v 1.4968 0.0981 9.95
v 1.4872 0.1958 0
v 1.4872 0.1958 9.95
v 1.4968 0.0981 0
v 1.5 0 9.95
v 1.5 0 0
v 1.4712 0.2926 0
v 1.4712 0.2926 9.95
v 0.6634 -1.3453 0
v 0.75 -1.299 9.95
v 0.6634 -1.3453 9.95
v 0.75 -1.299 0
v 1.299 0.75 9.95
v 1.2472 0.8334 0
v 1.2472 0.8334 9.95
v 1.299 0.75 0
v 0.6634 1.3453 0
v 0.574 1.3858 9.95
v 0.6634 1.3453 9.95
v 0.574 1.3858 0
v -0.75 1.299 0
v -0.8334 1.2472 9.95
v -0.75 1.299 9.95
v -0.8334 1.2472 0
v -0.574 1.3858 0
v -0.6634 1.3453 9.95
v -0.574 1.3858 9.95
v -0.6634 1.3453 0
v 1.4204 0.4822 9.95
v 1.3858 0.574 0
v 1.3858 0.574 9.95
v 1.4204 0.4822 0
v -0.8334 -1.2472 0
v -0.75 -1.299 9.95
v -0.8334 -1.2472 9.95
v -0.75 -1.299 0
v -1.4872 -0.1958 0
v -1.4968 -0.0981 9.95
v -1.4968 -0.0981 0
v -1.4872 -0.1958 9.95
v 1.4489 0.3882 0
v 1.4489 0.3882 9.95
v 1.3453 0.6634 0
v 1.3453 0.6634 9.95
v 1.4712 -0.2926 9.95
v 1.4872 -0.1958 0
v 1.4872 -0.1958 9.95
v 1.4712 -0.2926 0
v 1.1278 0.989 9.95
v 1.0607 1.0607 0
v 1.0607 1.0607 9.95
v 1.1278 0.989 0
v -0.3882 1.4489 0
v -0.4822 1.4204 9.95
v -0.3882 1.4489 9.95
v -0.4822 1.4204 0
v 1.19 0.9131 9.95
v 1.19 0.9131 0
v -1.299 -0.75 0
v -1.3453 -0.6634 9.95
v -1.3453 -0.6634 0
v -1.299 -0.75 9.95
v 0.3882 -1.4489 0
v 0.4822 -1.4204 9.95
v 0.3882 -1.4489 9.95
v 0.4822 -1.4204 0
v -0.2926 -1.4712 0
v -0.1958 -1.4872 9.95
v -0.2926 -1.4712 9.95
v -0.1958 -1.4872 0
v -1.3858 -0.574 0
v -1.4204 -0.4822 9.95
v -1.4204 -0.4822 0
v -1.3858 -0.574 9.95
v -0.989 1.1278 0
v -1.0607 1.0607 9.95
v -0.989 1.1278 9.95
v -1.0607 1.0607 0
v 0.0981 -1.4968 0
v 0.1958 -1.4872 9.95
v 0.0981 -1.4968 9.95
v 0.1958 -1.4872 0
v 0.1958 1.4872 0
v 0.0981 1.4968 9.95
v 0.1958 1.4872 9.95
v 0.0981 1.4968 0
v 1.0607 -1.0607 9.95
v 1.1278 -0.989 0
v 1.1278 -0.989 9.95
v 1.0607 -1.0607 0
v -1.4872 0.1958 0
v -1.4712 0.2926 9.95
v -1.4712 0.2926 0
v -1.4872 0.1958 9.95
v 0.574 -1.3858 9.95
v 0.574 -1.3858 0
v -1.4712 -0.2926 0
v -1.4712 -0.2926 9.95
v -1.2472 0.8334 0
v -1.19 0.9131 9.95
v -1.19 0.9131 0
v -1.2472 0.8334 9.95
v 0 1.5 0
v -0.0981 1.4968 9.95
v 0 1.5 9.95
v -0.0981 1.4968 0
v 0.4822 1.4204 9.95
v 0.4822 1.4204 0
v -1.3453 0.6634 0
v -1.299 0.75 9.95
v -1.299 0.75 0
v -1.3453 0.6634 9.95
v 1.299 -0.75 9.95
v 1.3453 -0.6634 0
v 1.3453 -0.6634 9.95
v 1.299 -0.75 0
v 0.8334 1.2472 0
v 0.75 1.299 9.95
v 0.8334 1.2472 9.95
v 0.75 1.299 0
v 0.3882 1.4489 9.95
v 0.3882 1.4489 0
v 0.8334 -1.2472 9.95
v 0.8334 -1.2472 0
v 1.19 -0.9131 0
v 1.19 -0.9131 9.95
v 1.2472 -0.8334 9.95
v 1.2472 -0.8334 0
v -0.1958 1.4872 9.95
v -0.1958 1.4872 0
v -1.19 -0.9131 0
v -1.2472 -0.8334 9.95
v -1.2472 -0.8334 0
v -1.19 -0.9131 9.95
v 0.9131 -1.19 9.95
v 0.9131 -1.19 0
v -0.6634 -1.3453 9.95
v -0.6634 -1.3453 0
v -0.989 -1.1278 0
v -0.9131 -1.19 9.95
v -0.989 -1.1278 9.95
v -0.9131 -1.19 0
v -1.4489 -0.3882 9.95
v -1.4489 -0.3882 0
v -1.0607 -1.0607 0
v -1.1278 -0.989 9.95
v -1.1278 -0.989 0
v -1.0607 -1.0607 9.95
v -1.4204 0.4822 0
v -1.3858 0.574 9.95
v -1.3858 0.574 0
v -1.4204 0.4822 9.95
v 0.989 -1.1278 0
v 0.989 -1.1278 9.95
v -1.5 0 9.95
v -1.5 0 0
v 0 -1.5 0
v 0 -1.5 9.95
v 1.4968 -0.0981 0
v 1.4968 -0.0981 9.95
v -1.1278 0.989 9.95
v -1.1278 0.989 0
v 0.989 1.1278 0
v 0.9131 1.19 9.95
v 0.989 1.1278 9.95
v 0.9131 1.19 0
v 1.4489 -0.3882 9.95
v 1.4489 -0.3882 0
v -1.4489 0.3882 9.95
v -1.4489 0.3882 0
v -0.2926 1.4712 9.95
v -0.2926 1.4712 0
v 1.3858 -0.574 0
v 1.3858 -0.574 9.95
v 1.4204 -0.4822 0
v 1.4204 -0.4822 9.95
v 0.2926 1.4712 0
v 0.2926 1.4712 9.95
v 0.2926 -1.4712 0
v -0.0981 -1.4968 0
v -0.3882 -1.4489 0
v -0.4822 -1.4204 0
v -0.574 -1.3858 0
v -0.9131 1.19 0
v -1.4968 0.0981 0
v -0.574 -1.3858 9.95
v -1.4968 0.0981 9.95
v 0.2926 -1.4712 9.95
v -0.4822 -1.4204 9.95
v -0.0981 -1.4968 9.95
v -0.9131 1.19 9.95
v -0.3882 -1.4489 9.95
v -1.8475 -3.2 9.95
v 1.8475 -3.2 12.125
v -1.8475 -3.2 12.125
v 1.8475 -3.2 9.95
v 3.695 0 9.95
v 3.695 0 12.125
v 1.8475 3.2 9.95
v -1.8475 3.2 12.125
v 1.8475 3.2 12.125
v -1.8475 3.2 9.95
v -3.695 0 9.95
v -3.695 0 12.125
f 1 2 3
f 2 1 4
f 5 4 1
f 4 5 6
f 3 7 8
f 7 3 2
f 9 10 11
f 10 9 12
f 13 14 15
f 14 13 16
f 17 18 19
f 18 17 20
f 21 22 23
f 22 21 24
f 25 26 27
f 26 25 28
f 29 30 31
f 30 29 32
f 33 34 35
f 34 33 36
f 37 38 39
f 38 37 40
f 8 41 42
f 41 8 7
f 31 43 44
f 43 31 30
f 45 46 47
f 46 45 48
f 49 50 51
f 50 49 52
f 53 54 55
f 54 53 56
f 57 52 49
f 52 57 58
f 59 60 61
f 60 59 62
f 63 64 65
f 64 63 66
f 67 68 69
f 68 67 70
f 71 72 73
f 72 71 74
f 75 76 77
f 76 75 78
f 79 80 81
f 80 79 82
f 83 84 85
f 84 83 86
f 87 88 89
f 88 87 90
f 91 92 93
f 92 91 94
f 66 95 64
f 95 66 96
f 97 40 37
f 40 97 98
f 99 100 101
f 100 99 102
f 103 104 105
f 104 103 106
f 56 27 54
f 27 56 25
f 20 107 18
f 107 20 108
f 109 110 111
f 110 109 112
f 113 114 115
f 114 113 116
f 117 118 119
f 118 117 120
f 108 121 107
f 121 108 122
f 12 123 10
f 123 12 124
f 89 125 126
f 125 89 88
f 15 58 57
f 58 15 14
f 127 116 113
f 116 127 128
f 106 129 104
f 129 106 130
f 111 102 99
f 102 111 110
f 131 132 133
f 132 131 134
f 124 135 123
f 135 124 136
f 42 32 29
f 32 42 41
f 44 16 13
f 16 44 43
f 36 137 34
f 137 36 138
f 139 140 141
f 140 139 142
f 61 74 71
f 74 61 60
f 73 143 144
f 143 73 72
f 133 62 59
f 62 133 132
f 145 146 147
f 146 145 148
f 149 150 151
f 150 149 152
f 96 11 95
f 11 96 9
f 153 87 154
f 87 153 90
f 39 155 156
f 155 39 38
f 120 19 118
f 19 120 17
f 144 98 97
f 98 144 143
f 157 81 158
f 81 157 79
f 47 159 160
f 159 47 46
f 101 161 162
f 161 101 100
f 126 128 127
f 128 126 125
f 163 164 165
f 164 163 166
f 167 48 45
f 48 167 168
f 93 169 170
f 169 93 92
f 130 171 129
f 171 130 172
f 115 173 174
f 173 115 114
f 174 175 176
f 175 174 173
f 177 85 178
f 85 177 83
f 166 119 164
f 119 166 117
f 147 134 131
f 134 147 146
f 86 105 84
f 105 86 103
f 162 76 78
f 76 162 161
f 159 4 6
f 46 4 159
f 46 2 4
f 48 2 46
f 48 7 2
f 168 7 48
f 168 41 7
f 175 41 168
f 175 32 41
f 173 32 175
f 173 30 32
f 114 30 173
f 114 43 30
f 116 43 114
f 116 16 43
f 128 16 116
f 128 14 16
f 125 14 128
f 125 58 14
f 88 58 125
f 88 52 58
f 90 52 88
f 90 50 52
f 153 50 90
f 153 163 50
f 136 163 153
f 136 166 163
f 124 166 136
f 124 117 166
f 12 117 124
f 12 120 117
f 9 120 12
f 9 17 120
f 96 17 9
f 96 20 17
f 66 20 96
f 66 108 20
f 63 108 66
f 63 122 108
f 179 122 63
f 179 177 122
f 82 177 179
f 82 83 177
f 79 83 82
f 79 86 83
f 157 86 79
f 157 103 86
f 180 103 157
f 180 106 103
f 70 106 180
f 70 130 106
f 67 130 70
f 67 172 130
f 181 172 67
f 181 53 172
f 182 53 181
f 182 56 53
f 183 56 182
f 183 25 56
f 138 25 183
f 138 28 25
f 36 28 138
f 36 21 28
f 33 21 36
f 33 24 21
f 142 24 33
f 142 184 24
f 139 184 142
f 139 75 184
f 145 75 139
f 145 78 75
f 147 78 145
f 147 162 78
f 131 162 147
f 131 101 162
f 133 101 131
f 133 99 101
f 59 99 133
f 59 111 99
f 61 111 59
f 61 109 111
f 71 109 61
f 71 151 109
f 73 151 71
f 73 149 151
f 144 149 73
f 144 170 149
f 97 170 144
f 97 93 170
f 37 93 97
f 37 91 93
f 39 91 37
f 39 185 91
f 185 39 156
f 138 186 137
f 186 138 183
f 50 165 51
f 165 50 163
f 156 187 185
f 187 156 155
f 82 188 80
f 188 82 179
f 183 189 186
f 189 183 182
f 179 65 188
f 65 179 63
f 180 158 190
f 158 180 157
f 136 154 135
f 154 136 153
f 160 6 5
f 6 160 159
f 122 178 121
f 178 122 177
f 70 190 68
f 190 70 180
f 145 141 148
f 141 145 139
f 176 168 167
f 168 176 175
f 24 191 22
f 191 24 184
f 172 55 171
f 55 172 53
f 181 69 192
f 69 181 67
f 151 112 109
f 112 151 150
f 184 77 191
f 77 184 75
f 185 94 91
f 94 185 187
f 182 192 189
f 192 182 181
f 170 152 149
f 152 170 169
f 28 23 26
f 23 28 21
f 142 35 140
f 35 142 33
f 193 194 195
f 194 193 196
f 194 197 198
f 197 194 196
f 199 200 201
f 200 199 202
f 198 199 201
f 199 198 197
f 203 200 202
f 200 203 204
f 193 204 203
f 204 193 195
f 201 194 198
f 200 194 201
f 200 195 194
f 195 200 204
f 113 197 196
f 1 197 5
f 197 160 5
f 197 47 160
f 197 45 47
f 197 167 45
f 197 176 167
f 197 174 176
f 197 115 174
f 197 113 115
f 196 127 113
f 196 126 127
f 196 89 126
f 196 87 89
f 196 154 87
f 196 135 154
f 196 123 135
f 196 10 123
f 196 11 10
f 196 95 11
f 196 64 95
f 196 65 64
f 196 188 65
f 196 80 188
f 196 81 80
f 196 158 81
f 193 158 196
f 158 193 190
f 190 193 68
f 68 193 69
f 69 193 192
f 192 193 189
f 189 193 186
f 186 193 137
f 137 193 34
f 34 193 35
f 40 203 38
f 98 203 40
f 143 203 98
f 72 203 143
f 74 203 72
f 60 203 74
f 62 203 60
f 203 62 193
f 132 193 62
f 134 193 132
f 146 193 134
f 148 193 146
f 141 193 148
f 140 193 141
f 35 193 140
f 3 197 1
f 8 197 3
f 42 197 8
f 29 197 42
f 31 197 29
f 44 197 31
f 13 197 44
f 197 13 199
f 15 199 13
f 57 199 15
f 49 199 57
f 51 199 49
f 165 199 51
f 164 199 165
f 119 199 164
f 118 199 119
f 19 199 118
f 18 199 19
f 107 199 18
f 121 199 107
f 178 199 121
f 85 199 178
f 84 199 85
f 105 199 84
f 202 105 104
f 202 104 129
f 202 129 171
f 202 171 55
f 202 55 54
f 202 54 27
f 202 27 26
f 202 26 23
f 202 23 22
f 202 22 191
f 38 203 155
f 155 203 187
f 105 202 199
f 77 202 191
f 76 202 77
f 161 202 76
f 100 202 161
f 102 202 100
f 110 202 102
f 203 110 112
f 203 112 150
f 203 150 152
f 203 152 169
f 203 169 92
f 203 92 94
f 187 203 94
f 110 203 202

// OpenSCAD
// Hex head screw (simple solid, no washer/buzzer/spacer)
// Specs: 3.0mm shank diameter, 6.4mm head diameter (across flats), head height 2.125mm, 10mm long (under head)

$fn = 96;

// Parameters (mm)
shaft_diameter_mm   = 3.0;
shaft_radius_mm     = shaft_diameter_mm/2;

length_under_head_mm = 10.0;     // shank length (under head)
head_across_flats_mm = 6.4;      // hex across flats
head_height_mm       = 2.125;

overlap_mm = 0.05;               // small overlap to ensure one connected solid

module hex_head_screw() {
    // Place bottom of shank at z=0, top of head at z=length_under_head+head_height
    union() {
        // Shank
        translate([0, 0, length_under_head_mm/2])
            cylinder(r=shaft_radius_mm, h=length_under_head_mm, center=true);

        // Hex head (across flats = head_across_flats_mm)
        // For a hex made with cylinder($fn=6), the given r is circumradius.
        // Across flats = 2 * r * cos(30) => r = (across_flats/2)/cos(30)
        head_r = (head_across_flats_mm/2) / cos(30);

        translate([0, 0, length_under_head_mm + head_height_mm/2 - overlap_mm/2])
            cylinder(r=head_r, h=head_height_mm + overlap_mm, center=true, $fn=6);
    }
}

hex_head_screw();
